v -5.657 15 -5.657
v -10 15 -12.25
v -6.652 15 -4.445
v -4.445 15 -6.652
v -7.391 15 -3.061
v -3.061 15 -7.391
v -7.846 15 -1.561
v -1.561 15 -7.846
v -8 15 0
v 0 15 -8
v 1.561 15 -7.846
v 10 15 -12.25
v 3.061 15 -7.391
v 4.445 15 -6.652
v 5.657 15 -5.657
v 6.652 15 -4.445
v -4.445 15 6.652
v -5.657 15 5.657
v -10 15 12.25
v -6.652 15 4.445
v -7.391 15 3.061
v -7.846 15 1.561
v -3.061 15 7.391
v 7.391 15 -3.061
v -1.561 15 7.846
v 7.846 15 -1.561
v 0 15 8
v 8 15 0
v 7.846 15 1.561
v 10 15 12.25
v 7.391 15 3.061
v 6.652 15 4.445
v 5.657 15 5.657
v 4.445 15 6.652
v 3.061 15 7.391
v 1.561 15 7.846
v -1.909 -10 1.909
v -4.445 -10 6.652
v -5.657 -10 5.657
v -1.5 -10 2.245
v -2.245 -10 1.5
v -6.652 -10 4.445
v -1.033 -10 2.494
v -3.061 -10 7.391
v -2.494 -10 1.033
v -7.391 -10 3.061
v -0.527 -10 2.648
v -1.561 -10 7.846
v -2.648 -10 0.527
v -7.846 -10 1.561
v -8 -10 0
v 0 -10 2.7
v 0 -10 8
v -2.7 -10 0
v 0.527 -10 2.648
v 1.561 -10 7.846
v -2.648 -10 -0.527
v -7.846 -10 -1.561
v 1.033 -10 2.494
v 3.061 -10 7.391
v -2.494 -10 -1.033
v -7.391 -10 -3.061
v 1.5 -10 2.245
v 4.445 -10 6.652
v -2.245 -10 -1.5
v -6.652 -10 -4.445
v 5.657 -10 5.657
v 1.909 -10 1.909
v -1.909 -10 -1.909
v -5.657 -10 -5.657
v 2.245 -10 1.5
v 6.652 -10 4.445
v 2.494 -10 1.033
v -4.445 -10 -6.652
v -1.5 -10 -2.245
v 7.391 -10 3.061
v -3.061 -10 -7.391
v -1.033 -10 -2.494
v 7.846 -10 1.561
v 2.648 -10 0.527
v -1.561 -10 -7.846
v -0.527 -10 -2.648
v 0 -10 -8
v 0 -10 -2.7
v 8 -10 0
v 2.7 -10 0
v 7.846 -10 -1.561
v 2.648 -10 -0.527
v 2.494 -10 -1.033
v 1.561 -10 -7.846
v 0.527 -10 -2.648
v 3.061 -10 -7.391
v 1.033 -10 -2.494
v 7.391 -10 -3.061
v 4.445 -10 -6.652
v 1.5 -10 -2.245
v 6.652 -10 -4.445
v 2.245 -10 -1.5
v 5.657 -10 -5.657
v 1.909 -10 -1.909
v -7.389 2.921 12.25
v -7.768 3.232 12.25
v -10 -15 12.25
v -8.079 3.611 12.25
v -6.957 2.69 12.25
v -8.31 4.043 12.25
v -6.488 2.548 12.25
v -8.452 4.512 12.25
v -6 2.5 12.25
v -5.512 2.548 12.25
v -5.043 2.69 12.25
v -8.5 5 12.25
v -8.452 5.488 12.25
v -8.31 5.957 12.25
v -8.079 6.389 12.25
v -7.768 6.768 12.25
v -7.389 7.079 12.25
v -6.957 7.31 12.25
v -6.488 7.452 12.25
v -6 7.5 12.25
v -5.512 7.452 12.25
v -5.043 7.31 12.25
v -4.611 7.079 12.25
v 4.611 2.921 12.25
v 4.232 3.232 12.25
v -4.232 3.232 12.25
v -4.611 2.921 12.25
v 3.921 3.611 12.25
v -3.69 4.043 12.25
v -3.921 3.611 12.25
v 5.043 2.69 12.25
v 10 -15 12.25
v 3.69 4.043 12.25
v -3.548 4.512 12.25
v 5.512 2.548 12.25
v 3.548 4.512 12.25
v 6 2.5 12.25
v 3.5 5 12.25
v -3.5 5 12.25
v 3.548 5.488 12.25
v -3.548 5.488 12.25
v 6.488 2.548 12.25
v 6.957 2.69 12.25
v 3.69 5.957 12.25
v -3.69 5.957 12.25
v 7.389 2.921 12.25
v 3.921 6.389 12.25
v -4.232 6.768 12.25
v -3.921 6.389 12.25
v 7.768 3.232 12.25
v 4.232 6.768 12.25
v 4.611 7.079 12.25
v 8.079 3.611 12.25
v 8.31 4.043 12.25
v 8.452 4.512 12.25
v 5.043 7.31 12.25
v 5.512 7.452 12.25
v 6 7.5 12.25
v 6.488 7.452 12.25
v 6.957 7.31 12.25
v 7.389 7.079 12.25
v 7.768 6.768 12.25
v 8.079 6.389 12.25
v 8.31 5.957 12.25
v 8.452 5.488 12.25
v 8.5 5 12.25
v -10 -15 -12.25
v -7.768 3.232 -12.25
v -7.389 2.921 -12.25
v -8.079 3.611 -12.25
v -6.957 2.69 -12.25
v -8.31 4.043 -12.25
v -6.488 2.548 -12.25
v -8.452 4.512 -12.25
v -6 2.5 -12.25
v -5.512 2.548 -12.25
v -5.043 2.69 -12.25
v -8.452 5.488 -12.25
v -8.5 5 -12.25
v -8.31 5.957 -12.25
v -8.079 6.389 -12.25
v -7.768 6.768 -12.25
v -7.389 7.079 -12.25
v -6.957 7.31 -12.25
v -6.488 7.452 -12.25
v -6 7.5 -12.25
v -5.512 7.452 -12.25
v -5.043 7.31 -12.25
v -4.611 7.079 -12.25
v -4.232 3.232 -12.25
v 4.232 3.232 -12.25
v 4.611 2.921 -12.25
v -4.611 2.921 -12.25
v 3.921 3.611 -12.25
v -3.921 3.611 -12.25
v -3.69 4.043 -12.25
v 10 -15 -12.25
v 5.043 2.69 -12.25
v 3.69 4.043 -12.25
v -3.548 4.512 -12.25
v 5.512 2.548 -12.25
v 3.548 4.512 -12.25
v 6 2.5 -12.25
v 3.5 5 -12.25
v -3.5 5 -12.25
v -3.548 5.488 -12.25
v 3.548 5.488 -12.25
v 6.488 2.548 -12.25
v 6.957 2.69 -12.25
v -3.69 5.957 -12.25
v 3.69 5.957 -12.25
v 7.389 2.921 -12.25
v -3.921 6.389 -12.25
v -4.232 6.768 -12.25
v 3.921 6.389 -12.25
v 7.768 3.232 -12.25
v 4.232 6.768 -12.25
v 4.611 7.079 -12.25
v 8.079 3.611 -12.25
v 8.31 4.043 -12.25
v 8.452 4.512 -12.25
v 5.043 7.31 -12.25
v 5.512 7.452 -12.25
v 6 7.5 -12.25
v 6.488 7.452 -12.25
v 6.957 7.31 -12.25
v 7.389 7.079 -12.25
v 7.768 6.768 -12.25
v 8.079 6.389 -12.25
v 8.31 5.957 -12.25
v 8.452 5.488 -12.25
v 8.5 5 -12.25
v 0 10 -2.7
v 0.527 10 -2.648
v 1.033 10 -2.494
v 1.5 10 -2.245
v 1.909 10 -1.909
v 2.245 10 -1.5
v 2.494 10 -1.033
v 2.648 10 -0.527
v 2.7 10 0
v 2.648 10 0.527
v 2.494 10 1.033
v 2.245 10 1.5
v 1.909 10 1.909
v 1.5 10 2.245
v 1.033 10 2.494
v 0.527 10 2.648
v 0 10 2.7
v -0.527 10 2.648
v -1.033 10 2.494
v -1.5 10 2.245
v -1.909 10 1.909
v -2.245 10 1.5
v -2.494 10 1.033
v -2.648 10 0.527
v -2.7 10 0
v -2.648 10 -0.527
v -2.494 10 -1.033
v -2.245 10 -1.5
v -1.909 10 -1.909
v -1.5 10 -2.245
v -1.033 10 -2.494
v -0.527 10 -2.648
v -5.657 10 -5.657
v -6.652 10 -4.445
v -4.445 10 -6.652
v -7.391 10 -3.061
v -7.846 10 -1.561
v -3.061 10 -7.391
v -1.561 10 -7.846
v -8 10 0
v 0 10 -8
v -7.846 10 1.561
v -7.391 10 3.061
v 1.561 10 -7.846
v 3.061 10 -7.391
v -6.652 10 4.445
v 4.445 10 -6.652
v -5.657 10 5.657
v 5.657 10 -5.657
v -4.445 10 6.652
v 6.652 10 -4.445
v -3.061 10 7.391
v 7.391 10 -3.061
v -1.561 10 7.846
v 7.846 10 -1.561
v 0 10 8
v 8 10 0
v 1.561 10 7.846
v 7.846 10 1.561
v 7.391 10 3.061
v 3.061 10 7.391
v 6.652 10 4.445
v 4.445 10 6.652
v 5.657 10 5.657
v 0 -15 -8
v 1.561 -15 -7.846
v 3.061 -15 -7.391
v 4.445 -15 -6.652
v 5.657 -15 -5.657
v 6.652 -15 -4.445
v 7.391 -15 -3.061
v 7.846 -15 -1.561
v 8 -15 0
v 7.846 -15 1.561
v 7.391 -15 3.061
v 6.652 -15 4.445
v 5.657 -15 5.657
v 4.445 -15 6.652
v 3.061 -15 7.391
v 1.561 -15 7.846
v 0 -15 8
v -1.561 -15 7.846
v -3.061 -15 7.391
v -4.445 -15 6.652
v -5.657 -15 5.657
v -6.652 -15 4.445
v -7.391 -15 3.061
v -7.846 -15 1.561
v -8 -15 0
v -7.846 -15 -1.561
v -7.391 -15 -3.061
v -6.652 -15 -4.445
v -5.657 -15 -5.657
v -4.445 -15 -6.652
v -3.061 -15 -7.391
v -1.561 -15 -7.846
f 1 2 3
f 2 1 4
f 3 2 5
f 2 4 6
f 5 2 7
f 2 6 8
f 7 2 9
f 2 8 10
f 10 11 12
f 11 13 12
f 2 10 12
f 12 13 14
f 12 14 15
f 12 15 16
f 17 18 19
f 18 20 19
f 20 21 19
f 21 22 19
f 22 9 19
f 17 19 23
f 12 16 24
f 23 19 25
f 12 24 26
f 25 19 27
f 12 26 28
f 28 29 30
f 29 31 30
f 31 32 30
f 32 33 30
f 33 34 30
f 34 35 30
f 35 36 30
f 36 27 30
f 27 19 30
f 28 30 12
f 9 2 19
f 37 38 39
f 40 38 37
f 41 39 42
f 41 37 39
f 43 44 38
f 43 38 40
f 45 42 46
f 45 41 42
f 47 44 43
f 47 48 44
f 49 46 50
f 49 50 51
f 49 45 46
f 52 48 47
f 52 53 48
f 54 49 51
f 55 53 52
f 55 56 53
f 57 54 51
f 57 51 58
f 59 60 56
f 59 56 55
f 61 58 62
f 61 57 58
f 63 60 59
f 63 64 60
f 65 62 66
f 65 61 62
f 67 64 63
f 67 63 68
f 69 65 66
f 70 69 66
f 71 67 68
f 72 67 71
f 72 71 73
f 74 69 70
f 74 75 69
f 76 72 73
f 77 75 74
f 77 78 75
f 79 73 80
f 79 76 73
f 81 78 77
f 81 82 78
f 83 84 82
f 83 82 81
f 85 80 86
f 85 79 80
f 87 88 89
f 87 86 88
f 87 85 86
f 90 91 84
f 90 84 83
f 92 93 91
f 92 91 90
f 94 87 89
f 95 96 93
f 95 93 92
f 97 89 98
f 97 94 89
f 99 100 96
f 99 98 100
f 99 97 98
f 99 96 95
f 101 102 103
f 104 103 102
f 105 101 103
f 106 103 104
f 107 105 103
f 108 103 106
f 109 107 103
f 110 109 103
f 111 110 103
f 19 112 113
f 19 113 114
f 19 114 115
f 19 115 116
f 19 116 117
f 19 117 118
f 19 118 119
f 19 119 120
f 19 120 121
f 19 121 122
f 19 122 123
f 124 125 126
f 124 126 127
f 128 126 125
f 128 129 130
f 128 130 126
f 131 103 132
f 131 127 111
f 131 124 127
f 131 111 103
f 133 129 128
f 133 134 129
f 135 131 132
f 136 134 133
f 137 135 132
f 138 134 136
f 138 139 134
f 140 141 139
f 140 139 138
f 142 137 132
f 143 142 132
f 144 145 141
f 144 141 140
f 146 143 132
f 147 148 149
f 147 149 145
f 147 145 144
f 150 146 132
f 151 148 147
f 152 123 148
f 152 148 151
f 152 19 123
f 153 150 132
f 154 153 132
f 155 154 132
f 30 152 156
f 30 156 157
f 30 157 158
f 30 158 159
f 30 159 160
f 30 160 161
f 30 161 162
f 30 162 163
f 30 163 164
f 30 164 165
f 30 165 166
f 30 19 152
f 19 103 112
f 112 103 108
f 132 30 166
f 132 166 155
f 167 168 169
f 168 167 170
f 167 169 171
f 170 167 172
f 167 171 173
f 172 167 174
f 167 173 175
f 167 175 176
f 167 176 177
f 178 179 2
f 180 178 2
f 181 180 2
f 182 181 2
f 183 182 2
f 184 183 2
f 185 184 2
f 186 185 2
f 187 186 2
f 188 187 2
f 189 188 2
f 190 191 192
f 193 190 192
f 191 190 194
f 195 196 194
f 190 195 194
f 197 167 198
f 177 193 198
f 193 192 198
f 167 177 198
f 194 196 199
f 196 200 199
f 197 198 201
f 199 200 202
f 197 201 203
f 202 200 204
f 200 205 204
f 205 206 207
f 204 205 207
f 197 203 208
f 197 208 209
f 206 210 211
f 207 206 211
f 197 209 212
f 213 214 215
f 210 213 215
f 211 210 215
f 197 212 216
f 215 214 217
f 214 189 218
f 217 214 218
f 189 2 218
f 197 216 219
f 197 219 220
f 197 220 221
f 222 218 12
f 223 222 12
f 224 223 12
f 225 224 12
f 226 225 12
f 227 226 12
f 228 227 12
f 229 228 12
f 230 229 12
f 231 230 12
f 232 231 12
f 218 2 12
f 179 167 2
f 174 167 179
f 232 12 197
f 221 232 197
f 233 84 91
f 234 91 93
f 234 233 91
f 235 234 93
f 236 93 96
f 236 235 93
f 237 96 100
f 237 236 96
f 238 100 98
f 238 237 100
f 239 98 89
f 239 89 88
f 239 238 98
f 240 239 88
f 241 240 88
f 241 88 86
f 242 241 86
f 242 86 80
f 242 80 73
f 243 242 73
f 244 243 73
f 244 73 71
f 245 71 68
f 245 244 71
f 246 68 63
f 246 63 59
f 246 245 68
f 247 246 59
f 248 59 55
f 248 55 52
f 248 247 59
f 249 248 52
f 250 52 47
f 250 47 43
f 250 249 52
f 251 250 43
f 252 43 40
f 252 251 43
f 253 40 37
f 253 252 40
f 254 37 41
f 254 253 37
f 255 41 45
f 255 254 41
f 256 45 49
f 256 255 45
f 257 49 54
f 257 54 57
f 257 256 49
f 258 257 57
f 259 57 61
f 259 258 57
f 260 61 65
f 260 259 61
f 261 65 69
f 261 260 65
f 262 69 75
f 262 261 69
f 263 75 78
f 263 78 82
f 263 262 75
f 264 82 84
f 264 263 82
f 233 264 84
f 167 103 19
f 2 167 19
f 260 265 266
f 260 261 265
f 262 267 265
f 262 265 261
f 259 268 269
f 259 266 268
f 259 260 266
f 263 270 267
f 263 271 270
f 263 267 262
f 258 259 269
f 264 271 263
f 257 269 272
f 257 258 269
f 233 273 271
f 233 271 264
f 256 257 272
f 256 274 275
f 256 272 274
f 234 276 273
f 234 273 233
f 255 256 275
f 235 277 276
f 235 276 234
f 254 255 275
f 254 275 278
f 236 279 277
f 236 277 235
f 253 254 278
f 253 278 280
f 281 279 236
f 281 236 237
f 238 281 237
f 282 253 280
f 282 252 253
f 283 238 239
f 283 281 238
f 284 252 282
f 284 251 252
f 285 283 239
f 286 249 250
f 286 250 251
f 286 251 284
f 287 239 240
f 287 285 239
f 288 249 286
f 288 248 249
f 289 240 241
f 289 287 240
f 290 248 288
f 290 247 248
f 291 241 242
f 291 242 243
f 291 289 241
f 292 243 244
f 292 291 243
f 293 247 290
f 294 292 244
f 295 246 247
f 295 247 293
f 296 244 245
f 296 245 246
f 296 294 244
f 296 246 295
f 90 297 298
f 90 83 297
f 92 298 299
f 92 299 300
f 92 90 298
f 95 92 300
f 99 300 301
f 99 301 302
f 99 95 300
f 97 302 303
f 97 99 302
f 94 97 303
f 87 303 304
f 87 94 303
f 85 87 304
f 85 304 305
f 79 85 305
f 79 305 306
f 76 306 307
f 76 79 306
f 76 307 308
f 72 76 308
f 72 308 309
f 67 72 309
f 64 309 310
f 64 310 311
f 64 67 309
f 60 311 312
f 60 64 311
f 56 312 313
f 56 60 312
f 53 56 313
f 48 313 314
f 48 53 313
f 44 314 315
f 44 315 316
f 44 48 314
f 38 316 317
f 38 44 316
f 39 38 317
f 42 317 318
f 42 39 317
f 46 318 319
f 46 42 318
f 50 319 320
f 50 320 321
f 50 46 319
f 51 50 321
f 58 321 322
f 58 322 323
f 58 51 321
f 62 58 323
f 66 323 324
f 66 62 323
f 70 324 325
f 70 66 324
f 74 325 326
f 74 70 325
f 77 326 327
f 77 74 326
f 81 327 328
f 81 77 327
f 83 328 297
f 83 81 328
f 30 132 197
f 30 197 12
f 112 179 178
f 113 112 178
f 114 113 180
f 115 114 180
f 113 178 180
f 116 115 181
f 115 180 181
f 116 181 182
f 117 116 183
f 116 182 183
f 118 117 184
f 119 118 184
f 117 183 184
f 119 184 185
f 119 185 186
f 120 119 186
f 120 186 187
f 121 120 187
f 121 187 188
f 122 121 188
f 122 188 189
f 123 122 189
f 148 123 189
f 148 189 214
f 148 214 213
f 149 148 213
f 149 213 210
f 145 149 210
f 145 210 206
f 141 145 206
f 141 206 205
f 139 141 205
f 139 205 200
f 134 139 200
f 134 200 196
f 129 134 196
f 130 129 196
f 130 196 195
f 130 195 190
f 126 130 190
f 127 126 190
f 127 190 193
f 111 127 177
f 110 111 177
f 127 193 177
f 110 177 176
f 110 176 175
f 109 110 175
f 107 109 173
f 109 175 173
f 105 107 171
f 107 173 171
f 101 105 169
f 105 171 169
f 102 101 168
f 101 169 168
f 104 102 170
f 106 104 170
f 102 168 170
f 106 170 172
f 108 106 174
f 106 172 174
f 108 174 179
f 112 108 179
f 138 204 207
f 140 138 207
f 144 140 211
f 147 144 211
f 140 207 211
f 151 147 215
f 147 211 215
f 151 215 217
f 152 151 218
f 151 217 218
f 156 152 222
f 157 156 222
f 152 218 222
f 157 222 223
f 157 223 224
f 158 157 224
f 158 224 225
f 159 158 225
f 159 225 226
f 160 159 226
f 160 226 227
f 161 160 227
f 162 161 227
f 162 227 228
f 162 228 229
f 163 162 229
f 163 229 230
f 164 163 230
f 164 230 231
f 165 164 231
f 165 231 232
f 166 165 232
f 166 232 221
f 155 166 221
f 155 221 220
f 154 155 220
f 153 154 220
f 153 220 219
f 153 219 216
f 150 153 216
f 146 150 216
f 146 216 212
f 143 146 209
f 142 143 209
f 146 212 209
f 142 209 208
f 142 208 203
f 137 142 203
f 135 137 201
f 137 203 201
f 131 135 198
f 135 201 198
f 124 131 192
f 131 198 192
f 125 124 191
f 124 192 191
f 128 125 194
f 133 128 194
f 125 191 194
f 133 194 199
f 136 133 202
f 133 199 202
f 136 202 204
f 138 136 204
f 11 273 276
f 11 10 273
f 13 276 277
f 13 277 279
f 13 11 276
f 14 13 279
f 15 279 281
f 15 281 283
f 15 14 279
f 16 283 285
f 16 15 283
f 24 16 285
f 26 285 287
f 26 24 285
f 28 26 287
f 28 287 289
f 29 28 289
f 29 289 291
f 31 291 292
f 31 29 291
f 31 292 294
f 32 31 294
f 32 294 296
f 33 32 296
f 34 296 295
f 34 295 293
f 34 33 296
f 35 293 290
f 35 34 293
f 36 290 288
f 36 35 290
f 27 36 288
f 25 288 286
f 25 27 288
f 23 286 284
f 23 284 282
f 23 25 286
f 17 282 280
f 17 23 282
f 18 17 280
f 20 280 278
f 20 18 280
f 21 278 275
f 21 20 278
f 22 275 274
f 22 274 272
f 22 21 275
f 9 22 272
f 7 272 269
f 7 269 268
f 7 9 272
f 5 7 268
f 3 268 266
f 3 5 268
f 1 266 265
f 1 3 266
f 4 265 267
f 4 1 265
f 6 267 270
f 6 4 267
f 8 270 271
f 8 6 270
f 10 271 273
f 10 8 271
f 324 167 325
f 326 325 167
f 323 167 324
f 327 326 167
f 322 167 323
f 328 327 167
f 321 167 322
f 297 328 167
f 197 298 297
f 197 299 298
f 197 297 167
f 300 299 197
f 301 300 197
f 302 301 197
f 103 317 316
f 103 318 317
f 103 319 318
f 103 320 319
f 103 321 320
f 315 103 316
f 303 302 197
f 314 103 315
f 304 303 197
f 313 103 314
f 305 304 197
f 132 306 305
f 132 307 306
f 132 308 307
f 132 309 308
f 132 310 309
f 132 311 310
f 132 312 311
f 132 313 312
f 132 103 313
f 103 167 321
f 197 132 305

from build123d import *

# Parameters (mm, degrees)
SKETCH1_W           = 20
SKETCH1_H           = 30
BOSS_EXTRUDE1_DEPTH = 12.25
SKETCH4_R           = 2.5
CUT_EXTRUDE1_DEPTH  = 25.5


with BuildPart() as part:
    # Sketch1 → Boss-Extrude1 (new body, symmetric)
    with BuildSketch(Plane.XY):
        Rectangle(SKETCH1_W, SKETCH1_H)
    extrude(amount=BOSS_EXTRUDE1_DEPTH, both=True)

    # Sketch3 → Cut-Revolve1 (revolve, cut)
    with BuildSketch(Plane(origin=(0, 0, 0), x_dir=(0, 0, -1), z_dir=(1, 0, 0))):
        Polygon((0, 15), (0, -15), (8, -15), (8, -10), (2.7, -10), (2.7, 10), (8, 10), (8, 15), align=None)
    revolve(axis=Axis((0, 15, 0), (0, -1, 0)), mode=Mode.SUBTRACT)

    # Sketch4 → Cut-Extrude1 (cut, through all)
    with BuildSketch(Plane(origin=(0, 0, -12.25), x_dir=(-1, 0, 0), z_dir=(0, 0, -1))):
        with Locations((-6, 5)):
            Circle(SKETCH4_R)
        with Locations((6, 5)):
            Circle(SKETCH4_R)
    extrude(amount=-CUT_EXTRUDE1_DEPTH, mode=Mode.SUBTRACT)


solid = part.part
